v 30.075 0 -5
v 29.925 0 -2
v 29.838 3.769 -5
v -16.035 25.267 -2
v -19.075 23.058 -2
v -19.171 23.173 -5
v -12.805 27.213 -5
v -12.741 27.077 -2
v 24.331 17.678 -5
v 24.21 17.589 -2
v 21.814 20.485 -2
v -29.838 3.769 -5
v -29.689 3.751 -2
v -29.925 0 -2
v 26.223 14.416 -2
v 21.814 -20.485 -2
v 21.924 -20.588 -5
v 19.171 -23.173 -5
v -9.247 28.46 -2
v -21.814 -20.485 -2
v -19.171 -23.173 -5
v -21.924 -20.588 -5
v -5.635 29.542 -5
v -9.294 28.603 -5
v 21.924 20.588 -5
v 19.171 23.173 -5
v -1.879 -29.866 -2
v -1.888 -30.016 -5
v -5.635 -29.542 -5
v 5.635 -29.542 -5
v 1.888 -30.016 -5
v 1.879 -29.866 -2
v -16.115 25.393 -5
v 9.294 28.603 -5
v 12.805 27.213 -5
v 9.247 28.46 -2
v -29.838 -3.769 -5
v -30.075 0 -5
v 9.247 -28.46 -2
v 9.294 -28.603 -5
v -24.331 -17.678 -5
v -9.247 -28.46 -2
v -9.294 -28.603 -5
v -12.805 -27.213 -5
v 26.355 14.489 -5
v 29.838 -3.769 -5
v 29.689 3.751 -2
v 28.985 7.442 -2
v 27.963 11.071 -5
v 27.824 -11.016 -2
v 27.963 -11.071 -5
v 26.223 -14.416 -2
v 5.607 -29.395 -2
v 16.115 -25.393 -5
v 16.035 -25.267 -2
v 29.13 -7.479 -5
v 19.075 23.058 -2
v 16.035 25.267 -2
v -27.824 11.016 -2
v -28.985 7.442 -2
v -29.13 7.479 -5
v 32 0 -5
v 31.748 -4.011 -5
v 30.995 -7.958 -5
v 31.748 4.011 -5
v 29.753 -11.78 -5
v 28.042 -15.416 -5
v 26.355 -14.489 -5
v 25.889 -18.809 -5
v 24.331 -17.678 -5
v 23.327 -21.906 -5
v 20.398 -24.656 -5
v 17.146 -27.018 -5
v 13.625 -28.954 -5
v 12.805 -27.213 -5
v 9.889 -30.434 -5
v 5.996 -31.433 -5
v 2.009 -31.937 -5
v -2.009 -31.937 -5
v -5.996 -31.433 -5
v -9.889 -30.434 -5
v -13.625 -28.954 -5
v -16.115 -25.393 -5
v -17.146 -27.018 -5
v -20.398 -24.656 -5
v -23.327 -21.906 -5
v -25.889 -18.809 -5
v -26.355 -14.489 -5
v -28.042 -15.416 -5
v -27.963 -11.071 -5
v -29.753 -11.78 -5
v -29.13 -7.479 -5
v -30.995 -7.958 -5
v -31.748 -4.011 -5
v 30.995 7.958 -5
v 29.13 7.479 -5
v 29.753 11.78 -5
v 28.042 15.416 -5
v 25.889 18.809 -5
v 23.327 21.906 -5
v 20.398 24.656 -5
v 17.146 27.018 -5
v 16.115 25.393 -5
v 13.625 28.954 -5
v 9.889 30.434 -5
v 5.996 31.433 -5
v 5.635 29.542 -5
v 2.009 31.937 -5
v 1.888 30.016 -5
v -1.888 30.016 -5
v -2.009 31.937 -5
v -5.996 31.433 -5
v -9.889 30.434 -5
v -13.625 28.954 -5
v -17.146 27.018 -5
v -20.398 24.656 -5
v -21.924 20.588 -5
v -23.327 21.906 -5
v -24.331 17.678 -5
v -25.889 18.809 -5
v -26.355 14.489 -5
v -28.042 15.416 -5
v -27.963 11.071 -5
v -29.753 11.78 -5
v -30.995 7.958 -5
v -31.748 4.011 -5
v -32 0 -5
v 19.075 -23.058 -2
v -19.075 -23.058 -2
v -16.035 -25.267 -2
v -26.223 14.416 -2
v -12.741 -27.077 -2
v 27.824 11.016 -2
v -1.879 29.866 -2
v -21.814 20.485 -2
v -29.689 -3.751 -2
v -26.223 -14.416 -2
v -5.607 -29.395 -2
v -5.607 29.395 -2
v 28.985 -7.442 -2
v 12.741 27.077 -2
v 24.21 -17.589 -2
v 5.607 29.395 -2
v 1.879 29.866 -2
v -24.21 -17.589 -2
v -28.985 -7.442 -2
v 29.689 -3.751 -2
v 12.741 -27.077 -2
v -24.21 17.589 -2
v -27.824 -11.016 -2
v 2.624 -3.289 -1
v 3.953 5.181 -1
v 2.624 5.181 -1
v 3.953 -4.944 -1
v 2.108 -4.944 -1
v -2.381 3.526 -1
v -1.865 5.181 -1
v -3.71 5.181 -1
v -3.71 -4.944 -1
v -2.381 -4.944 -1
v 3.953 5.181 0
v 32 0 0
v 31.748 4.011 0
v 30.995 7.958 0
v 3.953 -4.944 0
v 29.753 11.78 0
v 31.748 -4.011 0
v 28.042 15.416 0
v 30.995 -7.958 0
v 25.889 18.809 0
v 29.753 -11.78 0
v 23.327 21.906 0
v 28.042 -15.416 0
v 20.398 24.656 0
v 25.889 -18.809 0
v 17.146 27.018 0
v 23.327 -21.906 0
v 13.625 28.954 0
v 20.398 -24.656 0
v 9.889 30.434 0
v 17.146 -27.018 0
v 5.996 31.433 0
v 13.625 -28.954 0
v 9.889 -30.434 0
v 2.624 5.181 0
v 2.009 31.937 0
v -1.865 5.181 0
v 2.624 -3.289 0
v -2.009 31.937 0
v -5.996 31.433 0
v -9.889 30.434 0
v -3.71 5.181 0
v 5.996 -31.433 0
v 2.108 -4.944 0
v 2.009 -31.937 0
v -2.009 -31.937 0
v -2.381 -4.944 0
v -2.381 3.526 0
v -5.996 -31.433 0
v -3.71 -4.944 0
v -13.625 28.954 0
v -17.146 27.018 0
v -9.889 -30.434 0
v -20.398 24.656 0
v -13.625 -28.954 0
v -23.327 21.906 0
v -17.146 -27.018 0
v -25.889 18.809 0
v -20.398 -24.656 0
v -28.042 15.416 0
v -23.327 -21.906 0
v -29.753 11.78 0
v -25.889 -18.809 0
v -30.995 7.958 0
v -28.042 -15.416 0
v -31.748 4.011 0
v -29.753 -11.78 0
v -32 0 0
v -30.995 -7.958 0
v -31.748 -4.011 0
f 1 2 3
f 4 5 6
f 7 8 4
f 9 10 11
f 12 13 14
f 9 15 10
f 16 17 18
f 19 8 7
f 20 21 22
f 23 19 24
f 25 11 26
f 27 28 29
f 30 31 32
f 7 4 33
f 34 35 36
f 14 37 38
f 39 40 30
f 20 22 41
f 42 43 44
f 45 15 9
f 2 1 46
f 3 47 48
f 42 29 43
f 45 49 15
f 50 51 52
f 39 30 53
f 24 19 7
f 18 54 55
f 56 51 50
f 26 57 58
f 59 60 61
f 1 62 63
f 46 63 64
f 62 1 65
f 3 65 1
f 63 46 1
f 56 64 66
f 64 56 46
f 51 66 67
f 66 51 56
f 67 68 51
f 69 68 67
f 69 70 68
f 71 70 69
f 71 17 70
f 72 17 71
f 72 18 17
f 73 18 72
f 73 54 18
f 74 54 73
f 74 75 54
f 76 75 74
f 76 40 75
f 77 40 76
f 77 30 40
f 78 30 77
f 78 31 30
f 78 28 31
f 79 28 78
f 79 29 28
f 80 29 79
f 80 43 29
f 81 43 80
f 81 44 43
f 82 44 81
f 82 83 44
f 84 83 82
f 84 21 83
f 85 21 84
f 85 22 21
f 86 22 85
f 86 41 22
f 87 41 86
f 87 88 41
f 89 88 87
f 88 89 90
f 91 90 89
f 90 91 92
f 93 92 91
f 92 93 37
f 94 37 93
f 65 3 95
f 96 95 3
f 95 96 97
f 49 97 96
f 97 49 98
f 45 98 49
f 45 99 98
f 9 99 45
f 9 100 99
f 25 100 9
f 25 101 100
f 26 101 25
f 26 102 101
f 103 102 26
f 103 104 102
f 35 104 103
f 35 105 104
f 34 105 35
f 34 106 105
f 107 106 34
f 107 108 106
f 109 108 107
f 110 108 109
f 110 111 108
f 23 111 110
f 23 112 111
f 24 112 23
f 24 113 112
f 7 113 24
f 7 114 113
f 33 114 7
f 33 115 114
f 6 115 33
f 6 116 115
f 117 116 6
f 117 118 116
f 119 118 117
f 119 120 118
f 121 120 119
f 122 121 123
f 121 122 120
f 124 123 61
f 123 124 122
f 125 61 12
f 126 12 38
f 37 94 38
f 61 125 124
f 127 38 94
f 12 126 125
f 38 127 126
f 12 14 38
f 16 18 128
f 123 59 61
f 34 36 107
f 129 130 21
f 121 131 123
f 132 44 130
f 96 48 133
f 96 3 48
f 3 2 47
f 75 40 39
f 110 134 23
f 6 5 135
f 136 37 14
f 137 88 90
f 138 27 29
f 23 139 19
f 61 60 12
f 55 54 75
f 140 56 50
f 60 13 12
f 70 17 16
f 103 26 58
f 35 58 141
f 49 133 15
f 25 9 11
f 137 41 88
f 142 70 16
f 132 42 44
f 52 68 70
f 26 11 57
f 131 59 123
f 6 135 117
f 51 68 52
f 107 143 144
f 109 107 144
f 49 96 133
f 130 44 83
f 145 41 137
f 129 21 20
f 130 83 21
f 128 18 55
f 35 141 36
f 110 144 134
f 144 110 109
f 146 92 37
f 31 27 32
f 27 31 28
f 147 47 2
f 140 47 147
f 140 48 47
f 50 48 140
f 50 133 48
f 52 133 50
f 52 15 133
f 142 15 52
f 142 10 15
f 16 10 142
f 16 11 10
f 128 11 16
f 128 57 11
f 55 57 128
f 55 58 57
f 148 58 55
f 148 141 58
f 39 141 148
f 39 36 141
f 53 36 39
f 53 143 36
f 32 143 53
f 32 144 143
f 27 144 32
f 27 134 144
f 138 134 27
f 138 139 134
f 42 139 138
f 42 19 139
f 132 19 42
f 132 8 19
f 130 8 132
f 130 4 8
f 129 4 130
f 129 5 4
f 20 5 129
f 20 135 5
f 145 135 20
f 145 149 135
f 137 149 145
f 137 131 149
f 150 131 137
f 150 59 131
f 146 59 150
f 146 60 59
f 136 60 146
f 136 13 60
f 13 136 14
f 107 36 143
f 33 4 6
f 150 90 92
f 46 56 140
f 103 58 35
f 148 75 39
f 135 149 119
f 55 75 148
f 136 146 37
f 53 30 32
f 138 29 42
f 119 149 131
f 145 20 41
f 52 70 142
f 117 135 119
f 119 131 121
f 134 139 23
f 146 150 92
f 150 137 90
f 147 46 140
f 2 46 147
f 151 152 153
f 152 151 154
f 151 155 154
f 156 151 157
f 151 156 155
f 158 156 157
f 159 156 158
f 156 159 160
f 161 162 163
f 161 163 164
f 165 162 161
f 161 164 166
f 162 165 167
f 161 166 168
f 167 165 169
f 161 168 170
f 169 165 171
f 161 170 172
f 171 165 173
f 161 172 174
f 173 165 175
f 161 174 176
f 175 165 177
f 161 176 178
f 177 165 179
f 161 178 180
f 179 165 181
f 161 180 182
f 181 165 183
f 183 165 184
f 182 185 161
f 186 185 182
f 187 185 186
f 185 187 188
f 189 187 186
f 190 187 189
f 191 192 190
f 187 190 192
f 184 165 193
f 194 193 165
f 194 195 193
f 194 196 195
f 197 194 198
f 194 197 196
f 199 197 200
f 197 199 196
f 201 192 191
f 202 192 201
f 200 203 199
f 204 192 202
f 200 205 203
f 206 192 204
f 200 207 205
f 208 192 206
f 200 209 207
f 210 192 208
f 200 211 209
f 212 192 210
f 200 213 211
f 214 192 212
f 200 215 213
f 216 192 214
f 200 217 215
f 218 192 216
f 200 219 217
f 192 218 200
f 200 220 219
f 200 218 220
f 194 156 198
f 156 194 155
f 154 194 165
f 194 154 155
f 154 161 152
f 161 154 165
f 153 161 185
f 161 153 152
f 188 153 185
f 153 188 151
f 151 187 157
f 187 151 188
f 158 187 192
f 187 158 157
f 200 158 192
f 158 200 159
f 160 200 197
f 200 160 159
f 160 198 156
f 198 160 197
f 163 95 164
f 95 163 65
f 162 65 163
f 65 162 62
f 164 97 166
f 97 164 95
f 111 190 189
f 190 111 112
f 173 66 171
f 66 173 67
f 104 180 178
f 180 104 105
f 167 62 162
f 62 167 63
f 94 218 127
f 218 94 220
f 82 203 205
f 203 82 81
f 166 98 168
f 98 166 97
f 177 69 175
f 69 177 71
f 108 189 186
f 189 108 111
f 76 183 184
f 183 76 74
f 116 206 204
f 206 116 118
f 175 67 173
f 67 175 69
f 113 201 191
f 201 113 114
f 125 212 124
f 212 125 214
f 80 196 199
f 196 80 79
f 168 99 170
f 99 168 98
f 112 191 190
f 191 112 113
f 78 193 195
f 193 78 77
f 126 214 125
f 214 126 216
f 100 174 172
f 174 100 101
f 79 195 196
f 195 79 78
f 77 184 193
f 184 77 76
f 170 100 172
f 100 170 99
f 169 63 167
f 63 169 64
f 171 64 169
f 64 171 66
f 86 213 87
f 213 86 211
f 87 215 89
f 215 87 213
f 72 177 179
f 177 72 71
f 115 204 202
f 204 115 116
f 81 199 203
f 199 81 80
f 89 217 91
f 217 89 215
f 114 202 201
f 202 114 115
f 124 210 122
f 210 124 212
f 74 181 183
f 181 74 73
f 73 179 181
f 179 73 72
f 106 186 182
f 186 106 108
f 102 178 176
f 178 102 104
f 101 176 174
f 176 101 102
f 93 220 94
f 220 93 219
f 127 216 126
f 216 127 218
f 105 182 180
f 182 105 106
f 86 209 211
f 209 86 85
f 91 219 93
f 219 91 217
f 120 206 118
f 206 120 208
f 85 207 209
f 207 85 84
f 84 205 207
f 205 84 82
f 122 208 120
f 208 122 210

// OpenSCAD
$fn = 50;


difference() {
	union() {
		translate(v = [0, 0, -5.0000000000]) {
			cylinder(h = 5, r = 32.0000000000);
		}
	}
	union() {
		#translate(v = [0, 0, -5.0000000000]) {
			cylinder(h = 3, r1 = 30.0750000000, r2 = 29.9250000000);
		}
		translate(v = [0, 0, -1]) {
			linear_extrude(height = 1) {
				text(font = "Impact", halign = "center", size = 10, text = "N", valign = "center");
			}
		}
	}
}
